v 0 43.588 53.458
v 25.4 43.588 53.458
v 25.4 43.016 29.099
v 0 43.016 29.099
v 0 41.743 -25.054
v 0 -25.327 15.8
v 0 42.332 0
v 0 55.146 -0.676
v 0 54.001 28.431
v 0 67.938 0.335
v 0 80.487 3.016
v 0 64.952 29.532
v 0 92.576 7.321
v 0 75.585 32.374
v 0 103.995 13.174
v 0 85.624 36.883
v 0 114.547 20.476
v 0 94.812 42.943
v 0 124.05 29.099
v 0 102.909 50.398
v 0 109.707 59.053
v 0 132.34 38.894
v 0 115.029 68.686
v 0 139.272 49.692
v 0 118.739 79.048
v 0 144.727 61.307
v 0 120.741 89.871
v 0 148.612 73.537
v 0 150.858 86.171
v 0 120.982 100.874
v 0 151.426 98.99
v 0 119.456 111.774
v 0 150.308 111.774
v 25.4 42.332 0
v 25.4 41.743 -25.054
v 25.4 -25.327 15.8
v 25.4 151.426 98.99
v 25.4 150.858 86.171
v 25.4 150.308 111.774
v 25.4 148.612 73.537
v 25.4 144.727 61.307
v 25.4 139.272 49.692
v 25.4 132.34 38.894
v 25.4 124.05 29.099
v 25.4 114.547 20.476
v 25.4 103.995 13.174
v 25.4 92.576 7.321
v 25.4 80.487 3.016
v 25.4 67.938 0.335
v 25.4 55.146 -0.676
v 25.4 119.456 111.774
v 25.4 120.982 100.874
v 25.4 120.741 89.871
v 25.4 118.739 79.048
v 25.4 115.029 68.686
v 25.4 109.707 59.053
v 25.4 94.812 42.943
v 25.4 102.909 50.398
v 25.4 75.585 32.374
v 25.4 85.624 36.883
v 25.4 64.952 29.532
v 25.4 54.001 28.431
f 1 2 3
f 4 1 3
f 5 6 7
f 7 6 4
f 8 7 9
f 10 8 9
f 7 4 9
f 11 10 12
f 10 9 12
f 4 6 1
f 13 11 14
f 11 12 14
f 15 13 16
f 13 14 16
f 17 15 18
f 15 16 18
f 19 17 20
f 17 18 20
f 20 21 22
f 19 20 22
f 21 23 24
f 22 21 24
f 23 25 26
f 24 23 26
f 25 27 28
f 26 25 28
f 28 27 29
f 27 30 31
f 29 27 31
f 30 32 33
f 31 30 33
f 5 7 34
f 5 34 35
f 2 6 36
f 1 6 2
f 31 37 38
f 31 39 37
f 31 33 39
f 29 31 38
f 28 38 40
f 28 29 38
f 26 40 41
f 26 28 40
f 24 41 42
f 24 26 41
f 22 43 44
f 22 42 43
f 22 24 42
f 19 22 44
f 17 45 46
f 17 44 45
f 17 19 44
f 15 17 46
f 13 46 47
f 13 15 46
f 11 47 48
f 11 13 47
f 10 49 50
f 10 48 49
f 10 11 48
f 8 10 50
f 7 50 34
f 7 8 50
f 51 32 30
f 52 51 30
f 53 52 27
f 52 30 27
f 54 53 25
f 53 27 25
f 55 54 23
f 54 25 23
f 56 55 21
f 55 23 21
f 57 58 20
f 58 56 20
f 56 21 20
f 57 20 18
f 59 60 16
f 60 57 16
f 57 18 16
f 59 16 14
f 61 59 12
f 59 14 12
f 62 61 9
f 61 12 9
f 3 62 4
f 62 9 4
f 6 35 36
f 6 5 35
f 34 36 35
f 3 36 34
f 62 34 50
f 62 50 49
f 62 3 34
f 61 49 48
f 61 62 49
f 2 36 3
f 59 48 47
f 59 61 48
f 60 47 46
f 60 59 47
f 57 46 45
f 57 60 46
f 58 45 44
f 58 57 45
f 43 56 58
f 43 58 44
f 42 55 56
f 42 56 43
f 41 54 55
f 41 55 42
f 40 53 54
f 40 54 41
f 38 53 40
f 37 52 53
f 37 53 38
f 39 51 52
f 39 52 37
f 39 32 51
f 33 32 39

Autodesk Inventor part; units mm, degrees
ref_plane "YZ Plane" through (0, 0, 0) normal (1, 0, 0) x (0, 1, 0)
ref_plane "XZ Plane" through (0, 0, 0) normal (0, 1, 0) x (-1, 0, 0)
ref_plane "XY Plane" through (0, 0, 0) normal (0, 0, 1) x (1, 0, 0)
sketch "Sketch1" plane through (0, 0, 0) normal (1, 0, 0) x (0, 1, 0)
  line L0 (-25.3272, 15.7999) -> (43.5881, 53.4579)
  line L1 (43.5881, 53.4579) -> (41.7432, -25.0535)
  line L2 (41.7432, -25.0535) -> (-25.3272, 15.7999)
  arc A0 (42.3319, 0) -> (150.3078, 111.7735) centre (53.869, 96.8953) ccw
  arc A1 (43.0157, 29.0986) -> (119.4561, 111.7735) centre (52.6501, 96.8661) ccw
  line L3 (119.4561, 111.7735) -> (150.3078, 111.7735)
  point P0 (0, 0)
  point P1 (20.0014, 14.7347)
extrude "Extrusion1" add sketch "Sketch1" along normal blind 25.4
properties part number "Arrow"
